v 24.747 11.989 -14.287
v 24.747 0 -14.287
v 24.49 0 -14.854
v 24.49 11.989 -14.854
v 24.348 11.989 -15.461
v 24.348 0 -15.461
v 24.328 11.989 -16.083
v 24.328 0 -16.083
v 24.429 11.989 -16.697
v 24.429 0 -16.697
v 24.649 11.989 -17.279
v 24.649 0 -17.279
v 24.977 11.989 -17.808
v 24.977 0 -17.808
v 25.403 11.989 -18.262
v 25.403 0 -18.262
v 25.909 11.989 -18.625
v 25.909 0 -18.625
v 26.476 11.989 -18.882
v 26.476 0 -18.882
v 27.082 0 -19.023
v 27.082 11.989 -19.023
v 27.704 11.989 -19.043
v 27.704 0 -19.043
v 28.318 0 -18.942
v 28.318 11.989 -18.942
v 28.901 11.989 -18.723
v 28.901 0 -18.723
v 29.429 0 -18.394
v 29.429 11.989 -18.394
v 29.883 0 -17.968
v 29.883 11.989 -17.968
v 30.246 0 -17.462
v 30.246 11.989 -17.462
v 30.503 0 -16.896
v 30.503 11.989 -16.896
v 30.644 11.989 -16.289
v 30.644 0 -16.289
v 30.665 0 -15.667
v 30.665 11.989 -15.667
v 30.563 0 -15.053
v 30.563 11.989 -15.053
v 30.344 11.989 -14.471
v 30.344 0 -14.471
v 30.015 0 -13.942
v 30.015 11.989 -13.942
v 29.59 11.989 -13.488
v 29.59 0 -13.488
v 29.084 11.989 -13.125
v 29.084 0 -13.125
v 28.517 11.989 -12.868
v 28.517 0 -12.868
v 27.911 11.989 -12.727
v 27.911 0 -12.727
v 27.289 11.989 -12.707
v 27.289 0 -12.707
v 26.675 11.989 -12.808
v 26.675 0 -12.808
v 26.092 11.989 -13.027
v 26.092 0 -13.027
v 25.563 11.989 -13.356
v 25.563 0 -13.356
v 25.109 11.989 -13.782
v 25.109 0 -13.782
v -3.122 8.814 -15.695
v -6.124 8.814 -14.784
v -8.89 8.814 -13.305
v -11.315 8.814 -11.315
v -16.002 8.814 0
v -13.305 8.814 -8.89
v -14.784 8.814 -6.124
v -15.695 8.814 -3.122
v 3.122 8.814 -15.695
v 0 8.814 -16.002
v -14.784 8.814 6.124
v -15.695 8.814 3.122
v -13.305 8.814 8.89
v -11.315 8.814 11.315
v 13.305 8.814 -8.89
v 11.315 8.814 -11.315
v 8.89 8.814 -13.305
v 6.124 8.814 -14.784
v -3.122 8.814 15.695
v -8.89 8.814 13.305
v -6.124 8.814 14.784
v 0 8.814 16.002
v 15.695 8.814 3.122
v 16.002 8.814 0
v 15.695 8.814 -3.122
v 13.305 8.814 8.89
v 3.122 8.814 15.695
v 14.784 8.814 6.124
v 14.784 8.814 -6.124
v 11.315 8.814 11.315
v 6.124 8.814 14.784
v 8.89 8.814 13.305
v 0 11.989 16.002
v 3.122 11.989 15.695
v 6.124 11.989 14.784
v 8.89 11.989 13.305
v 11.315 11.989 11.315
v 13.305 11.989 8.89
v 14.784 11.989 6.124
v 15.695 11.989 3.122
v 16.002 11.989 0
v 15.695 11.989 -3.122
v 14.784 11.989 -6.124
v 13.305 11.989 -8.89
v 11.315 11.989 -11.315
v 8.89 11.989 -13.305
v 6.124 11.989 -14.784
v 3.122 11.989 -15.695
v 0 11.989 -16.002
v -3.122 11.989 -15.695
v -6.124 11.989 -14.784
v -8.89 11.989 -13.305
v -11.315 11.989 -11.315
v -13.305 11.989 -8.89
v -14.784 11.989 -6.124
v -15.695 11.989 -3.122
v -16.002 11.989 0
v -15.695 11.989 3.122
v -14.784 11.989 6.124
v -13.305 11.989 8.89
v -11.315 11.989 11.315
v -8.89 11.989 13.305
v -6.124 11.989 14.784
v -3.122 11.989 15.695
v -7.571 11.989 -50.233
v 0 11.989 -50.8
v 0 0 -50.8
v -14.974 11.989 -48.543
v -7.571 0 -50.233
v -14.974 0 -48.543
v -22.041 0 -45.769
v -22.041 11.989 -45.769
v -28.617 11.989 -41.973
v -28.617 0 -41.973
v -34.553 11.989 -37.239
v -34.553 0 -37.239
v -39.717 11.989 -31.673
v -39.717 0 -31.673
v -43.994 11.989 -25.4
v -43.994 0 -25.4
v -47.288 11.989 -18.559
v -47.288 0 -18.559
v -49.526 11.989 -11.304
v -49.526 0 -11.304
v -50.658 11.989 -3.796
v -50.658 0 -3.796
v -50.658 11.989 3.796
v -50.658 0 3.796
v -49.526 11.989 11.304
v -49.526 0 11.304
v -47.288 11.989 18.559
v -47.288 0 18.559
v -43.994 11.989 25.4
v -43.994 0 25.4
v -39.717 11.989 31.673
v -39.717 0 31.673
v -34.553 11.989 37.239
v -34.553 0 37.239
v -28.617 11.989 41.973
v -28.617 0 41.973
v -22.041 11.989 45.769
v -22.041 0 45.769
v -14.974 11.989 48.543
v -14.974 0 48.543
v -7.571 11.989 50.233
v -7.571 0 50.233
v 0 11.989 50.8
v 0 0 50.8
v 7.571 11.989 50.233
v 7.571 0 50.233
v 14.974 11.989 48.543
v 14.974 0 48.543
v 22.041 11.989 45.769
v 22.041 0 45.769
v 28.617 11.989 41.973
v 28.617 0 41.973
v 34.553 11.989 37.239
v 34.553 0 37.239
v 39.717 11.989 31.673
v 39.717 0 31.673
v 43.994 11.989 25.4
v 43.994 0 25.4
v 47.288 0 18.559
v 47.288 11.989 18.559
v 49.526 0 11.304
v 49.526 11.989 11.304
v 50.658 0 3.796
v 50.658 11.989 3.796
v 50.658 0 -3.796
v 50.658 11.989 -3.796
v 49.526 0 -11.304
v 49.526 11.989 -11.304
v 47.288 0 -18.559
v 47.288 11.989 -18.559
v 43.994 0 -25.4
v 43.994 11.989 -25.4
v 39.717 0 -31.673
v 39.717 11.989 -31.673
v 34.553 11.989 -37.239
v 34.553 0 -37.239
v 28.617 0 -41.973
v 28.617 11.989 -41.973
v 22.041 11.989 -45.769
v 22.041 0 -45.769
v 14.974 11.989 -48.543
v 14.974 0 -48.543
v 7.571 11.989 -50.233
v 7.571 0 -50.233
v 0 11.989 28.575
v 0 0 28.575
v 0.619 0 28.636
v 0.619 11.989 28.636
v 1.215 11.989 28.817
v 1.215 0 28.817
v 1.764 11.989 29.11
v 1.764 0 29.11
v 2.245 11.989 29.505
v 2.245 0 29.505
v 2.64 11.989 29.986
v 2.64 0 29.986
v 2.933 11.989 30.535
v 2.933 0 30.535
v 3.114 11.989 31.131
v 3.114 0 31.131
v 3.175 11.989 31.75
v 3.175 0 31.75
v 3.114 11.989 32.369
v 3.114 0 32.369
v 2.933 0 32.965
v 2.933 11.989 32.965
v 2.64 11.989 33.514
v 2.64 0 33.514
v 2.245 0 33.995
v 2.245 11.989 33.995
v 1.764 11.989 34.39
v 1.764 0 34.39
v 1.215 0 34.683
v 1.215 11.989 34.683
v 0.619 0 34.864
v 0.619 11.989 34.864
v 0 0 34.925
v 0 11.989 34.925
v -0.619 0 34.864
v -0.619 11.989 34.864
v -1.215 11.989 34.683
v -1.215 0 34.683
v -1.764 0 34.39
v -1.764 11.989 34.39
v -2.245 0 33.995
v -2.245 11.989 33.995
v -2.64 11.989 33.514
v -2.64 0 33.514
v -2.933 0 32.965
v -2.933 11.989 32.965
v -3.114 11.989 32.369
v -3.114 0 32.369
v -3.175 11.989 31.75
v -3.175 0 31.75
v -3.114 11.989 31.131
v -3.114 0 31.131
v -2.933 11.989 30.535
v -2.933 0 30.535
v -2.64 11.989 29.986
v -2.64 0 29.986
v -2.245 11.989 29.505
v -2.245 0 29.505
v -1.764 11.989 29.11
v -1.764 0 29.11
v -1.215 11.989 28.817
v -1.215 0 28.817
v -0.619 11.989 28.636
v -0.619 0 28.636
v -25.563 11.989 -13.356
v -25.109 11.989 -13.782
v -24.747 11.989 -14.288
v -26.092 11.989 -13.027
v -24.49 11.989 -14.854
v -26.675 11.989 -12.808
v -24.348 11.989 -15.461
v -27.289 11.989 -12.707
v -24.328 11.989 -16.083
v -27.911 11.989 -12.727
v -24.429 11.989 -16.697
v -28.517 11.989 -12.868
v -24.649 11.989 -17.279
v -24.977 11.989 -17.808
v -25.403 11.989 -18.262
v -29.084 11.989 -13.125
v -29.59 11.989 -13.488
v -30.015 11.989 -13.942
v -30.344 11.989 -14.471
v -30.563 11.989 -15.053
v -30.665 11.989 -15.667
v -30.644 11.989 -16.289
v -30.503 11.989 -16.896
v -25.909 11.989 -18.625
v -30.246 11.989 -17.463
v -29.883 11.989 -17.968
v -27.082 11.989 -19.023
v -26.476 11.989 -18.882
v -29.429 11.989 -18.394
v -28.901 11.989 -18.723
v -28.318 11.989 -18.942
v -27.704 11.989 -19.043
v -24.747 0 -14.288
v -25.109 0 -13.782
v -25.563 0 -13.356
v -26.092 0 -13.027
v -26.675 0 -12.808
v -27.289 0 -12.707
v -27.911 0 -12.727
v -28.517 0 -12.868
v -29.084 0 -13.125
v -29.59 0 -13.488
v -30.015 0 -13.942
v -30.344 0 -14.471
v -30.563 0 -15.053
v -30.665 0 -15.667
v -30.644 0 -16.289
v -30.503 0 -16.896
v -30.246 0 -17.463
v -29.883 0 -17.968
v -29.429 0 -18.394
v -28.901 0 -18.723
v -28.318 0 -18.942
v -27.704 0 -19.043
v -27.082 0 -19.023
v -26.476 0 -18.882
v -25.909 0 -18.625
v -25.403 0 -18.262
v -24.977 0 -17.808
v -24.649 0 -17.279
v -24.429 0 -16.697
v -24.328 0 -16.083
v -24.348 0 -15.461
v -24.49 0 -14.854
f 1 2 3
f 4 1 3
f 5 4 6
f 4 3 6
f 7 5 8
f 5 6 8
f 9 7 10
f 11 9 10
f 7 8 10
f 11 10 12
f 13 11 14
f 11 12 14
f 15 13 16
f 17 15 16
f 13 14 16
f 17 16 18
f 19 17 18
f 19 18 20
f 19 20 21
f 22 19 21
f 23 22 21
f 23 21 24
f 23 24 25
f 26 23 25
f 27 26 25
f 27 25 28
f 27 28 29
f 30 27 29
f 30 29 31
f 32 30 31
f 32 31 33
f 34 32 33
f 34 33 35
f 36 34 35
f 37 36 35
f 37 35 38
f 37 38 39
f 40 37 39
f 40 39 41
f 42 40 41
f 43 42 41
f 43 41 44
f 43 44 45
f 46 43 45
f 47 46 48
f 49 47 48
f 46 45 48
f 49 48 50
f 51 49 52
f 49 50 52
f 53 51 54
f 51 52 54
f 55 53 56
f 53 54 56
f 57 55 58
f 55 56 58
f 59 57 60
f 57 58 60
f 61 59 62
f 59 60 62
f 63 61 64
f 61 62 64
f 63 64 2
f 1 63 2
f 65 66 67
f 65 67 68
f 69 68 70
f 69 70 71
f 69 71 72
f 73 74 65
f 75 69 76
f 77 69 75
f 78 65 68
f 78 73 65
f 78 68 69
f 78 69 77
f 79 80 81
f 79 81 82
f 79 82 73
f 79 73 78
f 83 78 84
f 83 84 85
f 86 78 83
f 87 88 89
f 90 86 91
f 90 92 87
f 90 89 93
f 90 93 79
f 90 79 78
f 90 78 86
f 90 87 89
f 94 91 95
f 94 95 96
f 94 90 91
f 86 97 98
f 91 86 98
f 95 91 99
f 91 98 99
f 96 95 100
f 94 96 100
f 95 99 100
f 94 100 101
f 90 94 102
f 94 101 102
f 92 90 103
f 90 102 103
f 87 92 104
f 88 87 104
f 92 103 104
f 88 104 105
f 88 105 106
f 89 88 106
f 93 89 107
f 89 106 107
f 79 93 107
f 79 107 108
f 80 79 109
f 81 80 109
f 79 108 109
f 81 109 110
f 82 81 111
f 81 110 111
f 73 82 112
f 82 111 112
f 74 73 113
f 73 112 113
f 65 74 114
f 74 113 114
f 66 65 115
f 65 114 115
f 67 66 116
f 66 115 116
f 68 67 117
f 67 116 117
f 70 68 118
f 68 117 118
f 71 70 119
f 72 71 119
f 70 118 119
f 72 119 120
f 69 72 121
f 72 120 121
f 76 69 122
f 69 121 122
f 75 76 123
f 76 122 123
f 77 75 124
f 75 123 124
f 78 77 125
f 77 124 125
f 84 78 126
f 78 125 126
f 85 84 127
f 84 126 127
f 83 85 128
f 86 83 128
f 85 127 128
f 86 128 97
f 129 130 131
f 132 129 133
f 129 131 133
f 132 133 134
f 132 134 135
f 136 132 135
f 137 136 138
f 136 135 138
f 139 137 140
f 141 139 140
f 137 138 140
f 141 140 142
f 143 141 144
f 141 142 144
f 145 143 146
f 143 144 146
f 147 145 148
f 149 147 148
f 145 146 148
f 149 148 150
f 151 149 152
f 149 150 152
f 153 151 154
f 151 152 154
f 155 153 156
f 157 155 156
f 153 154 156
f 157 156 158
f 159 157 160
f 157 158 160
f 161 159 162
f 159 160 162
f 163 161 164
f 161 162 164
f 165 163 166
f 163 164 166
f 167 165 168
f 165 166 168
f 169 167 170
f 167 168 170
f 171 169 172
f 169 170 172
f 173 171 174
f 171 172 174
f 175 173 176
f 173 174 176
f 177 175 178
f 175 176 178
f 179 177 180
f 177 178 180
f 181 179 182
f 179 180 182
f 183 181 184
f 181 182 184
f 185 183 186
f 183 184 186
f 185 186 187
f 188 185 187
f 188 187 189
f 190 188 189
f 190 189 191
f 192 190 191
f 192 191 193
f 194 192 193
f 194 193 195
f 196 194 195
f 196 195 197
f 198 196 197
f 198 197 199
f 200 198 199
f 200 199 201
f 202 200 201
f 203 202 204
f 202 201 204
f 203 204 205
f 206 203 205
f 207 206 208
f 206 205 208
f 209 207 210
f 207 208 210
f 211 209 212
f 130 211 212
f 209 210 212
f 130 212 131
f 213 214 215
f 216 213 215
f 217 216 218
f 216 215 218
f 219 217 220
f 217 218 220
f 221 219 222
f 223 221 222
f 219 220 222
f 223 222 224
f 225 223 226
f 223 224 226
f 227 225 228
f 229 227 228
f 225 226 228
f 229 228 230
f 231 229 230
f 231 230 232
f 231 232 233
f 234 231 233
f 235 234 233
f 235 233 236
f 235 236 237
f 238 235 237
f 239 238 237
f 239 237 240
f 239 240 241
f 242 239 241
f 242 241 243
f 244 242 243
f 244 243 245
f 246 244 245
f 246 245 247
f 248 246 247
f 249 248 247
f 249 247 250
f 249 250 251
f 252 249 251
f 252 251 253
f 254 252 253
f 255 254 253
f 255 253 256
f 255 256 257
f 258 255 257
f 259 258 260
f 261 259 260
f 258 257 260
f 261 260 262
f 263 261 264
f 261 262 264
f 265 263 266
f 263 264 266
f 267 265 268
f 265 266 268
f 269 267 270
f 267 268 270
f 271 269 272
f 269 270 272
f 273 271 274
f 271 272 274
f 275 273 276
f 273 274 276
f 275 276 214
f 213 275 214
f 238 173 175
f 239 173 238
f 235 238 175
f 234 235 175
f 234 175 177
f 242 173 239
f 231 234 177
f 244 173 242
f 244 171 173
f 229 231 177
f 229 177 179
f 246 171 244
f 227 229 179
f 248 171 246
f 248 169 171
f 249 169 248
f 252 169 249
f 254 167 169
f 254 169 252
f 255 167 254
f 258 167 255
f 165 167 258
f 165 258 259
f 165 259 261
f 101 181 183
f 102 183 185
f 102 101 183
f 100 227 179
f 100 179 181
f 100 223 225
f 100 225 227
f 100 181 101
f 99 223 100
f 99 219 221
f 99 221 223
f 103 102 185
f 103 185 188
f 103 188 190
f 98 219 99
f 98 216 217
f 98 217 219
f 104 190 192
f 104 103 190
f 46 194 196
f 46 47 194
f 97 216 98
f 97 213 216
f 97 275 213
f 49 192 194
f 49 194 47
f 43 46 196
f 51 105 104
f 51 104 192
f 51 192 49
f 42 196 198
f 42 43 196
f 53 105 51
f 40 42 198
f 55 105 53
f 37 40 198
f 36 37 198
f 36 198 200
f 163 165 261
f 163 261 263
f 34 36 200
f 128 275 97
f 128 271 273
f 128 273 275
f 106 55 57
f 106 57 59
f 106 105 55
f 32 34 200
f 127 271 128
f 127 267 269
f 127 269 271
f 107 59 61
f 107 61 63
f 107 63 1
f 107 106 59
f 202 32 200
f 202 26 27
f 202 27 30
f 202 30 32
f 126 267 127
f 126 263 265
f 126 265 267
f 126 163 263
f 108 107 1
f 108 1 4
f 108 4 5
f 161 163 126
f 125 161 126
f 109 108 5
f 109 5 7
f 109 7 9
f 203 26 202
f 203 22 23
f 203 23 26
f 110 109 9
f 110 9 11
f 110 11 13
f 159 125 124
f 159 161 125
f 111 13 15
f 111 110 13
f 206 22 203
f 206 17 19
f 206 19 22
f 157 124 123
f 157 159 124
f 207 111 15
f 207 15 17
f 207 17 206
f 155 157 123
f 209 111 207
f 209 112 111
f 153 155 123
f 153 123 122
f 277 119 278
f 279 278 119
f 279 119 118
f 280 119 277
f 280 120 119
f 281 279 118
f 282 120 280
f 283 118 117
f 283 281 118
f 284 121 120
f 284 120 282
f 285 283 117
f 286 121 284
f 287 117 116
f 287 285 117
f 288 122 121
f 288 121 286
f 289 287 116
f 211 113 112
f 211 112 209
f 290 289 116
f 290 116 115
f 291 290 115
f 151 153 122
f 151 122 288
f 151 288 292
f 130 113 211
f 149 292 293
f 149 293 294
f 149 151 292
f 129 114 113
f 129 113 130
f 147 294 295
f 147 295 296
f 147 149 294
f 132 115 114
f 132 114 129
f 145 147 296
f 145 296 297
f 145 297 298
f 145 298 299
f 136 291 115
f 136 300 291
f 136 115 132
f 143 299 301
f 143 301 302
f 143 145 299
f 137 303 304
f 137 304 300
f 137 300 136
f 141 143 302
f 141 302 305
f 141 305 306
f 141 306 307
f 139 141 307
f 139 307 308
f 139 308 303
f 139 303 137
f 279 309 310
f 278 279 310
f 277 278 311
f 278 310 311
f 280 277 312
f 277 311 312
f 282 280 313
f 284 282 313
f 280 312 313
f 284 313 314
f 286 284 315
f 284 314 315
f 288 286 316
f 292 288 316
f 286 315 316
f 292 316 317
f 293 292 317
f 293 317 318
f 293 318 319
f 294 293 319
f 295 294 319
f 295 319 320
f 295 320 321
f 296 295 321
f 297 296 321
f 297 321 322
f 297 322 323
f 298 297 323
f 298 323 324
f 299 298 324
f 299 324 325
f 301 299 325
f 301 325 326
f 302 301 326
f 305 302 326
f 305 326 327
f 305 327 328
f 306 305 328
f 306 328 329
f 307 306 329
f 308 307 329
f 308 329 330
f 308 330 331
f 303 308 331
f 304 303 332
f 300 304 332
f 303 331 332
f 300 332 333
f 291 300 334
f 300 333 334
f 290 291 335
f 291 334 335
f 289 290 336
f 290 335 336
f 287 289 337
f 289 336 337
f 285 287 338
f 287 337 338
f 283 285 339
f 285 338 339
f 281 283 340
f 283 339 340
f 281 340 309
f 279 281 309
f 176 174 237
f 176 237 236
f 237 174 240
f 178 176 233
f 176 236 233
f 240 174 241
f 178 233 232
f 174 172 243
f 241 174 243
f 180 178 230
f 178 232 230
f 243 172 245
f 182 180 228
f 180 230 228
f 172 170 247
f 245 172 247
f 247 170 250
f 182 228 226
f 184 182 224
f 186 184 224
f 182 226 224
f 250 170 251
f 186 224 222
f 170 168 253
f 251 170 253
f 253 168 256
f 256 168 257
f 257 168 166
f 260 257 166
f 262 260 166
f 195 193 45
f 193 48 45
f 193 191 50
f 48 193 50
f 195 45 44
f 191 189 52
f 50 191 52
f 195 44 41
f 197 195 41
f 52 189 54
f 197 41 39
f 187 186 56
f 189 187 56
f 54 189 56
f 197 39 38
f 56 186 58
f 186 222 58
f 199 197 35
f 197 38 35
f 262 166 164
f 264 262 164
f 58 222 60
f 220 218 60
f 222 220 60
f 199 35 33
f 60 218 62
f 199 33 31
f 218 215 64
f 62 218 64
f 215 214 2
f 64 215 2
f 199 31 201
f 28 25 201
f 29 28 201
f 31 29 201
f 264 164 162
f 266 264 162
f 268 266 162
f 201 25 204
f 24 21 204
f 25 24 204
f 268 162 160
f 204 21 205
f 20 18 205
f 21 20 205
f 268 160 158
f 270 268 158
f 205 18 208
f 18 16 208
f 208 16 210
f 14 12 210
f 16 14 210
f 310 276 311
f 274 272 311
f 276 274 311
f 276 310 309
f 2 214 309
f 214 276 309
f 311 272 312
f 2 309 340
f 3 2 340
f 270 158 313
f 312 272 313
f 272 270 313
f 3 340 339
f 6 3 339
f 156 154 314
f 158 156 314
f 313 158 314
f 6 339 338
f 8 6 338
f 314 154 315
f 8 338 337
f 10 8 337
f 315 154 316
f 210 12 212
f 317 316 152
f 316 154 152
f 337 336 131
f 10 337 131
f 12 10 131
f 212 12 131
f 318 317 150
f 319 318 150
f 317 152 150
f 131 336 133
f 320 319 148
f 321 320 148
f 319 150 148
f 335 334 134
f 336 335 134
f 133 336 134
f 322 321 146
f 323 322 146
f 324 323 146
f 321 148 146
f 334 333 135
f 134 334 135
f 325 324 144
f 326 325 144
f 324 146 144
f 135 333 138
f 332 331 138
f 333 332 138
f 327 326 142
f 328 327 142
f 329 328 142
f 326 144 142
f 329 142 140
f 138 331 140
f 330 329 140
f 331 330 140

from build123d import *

# Parameters (mm, degrees)
SKETCH1_R           = 50.8
BOSS_EXTRUDE1_DEPTH = 11.9888
SKETCH3_R           = 3.175
CUT_EXTRUDE1_DEPTH  = 73.835508685
CIRPATTERN1_COUNT   = 3
SKETCH4_R           = 16.002
CUT_EXTRUDE2_DEPTH  = 3.175


with BuildPart() as part:
    # Sketch1 → Boss-Extrude1 (new body)
    with BuildSketch(Plane(origin=(0, 0, 0), x_dir=(1, 0, 0), z_dir=(0, 1, 0))):
        Circle(SKETCH1_R)
    extrude(amount=BOSS_EXTRUDE1_DEPTH)

    # Sketch3 → Cut-Extrude1 (cut, through all)
    with BuildSketch(Plane.XZ):
        with Locations((0, 31.75)):
            Circle(SKETCH3_R)
    cut_extrude1 = extrude(amount=-CUT_EXTRUDE1_DEPTH, mode=Mode.SUBTRACT)

    # CirPattern1: Cut-Extrude1 ×3 about axis
    cirpattern1_axis = Axis((0, 0, 0), (0, -1, 0))
    for i in range(1, CIRPATTERN1_COUNT):
        add(cut_extrude1.rotate(cirpattern1_axis, i * 360 / CIRPATTERN1_COUNT), mode=Mode.SUBTRACT)

    # Sketch4 → Cut-Extrude2 (cut)
    with BuildSketch(Plane(origin=(0, 11.9888, 0), x_dir=(1, 0, 0), z_dir=(0, 1, 0))):
        Circle(SKETCH4_R)
    extrude(amount=-CUT_EXTRUDE2_DEPTH, mode=Mode.SUBTRACT)


solid = part.part
